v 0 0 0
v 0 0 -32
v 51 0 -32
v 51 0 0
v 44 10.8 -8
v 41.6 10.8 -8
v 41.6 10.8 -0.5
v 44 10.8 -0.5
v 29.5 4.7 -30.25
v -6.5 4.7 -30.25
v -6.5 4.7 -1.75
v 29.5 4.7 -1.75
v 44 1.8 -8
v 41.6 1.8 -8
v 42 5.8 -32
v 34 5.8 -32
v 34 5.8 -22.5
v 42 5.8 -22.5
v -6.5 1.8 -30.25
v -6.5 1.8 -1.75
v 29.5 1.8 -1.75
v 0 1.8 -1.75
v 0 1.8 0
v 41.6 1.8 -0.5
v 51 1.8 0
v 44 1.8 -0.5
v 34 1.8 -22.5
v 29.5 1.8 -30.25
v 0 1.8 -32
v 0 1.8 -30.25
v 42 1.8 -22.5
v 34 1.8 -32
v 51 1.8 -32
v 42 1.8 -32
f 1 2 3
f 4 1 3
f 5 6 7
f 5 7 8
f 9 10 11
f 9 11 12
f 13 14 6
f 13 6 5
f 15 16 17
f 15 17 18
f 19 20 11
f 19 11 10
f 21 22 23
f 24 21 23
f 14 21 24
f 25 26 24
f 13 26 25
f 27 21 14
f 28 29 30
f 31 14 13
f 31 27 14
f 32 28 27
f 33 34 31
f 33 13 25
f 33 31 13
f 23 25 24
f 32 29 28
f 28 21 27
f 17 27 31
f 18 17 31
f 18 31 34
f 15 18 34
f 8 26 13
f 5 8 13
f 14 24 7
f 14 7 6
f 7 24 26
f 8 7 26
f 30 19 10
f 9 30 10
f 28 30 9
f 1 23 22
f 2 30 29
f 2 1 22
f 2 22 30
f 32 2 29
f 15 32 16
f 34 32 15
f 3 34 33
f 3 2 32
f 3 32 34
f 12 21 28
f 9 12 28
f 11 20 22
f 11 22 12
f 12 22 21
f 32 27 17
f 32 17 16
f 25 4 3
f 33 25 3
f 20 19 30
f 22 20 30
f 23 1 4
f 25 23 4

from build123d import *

# Parameters (mm, degrees)
SKETCH1_W           = 51
SKETCH1_H           = 32
BOSS_EXTRUDE1_DEPTH = 1.8
SKETCH2_W           = 36
SKETCH2_H           = 28.5
BOSS_EXTRUDE2_DEPTH = 2.9
SKETCH3_W           = 2.4
SKETCH3_H           = 7.5
BOSS_EXTRUDE3_DEPTH = 9
SKETCH4_W           = 8
SKETCH4_H           = 9.5
BOSS_EXTRUDE4_DEPTH = 4


with BuildPart() as part:
    # Sketch1 → Boss-Extrude1 (new body)
    with BuildSketch(Plane(origin=(0, 0, 0), x_dir=(1, 0, 0), z_dir=(0, 1, 0))):
        with Locations((25.5, 16)):
            Rectangle(SKETCH1_W, SKETCH1_H)
    extrude(amount=BOSS_EXTRUDE1_DEPTH)

    # Sketch2 → Boss-Extrude2 (add)
    with BuildSketch(Plane(origin=(0, 1.8, 0), x_dir=(1, 0, 0), z_dir=(0, 1, 0))):
        with Locations((11.5, 16)):
            Rectangle(SKETCH2_W, SKETCH2_H)
    extrude(amount=BOSS_EXTRUDE2_DEPTH)

    # Sketch3 → Boss-Extrude3 (add)
    with BuildSketch(Plane(origin=(0, 1.8, 0), x_dir=(1, 0, 0), z_dir=(0, 1, 0))):
        with Locations((42.8, 4.25)):
            Rectangle(SKETCH3_W, SKETCH3_H)
    extrude(amount=BOSS_EXTRUDE3_DEPTH)

    # Sketch4 → Boss-Extrude4 (add)
    with BuildSketch(Plane(origin=(0, 1.8, 0), x_dir=(1, 0, 0), z_dir=(0, 1, 0))):
        with Locations((38, 27.25)):
            Rectangle(SKETCH4_W, SKETCH4_H)
    extrude(amount=BOSS_EXTRUDE4_DEPTH)


solid = part.part
